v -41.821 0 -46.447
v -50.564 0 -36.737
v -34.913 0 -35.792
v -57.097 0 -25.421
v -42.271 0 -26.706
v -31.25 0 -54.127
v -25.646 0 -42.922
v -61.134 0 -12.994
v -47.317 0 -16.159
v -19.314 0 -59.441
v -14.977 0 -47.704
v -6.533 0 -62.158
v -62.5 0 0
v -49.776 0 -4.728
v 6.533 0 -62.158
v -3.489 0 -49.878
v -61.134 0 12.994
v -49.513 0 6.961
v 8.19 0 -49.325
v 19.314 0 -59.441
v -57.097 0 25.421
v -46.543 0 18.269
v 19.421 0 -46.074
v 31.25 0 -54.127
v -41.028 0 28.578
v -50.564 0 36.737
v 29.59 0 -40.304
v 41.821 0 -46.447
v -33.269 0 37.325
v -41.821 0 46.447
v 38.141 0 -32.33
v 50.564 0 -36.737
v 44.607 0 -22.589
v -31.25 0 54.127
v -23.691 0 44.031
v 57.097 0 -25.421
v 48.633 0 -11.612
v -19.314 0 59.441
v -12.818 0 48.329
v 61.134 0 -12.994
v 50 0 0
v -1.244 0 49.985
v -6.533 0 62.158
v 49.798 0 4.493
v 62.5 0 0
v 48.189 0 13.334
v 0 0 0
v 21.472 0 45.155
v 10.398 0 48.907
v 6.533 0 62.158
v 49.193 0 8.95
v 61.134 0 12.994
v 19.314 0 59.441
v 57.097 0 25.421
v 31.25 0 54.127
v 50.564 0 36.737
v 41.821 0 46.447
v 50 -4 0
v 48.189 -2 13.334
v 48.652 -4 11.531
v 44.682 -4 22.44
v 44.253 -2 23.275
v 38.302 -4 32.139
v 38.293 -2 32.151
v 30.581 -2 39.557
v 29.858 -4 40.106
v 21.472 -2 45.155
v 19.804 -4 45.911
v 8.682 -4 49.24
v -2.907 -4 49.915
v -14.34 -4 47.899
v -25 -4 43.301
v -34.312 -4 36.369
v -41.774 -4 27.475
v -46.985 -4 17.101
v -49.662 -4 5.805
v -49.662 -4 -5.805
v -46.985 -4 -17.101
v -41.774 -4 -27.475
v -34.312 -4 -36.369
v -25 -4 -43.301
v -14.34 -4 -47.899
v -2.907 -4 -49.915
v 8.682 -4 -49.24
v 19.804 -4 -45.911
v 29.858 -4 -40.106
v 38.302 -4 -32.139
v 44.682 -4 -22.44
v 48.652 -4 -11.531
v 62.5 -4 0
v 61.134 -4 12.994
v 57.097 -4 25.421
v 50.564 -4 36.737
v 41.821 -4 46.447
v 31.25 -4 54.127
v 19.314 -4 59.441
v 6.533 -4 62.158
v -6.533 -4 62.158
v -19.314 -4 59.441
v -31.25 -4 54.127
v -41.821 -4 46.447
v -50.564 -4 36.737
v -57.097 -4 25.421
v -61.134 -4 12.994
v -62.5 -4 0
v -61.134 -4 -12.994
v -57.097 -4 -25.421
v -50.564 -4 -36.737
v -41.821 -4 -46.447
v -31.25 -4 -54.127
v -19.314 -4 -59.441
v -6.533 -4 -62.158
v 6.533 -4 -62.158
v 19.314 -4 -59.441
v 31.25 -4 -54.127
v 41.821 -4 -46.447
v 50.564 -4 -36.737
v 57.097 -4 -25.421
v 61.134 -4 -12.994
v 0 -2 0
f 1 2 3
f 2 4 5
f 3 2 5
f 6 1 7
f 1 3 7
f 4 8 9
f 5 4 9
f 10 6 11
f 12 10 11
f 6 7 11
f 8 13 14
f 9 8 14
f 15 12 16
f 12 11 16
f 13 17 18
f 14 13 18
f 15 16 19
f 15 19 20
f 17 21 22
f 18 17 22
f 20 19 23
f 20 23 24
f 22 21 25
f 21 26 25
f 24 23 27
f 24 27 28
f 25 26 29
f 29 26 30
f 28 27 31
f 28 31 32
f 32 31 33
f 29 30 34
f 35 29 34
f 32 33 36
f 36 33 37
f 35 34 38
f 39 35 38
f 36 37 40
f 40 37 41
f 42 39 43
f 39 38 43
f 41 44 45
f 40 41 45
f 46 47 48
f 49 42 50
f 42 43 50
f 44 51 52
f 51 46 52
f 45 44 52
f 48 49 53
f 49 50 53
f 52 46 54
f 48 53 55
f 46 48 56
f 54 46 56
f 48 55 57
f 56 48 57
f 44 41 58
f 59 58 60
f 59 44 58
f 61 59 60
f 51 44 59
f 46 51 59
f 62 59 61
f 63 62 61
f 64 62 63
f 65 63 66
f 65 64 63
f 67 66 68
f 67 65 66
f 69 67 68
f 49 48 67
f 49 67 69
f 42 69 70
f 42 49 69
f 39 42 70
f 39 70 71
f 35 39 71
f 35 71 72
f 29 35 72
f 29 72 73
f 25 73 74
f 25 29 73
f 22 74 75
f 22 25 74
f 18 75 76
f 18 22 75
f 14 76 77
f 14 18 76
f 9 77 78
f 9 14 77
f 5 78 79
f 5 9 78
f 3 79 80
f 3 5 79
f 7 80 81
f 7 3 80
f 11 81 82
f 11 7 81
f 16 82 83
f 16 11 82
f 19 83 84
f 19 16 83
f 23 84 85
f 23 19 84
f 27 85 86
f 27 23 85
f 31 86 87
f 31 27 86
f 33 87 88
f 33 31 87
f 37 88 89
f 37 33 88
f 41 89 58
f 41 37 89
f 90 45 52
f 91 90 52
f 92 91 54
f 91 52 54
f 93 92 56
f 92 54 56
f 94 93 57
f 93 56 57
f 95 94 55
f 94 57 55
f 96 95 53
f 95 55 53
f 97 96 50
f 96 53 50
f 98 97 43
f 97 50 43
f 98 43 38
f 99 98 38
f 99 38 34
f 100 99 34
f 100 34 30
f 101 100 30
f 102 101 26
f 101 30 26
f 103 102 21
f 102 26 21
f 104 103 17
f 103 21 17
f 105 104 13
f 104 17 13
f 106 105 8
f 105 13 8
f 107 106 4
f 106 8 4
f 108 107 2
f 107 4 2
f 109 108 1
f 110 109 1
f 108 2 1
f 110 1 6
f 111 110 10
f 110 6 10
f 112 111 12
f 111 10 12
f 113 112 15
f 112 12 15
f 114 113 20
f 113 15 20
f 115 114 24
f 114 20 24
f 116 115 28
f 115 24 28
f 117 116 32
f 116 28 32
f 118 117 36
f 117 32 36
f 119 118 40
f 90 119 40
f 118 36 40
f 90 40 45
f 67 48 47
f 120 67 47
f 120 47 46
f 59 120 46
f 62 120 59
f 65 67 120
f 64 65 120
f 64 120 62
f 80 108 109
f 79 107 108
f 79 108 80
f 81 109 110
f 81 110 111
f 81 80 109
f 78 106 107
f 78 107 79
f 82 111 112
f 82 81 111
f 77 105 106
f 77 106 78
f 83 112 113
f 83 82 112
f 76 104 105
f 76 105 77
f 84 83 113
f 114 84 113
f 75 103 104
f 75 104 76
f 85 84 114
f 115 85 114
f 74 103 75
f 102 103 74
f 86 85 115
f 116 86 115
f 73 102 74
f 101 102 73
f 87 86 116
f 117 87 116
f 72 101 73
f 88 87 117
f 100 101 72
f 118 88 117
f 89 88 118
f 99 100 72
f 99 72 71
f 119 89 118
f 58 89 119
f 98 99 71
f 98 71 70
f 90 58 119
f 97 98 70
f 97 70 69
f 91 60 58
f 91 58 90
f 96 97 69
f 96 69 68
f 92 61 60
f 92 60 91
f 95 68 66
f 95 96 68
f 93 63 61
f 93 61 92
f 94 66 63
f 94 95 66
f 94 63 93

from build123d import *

# Parameters (mm, degrees)
F0_R     = 62.5
F0_R_2   = 50
F1_DEPTH = 4
F3_DEPTH = 2


with BuildPart() as f1:
    # F0 (on Front) → F1 (new body)
    with BuildSketch(Plane.XZ):
        Circle(F0_R)
        Circle(F0_R_2, mode=Mode.SUBTRACT)
    extrude(amount=F1_DEPTH)

    # F2 (on Front) → F3 (join)
    with BuildSketch(Plane.XZ):
        Polygon((0, 0), (54.283127, 15.019991), (24.187325, 50.864834), align=None)
    extrude(amount=F3_DEPTH)


solid = f1.part
